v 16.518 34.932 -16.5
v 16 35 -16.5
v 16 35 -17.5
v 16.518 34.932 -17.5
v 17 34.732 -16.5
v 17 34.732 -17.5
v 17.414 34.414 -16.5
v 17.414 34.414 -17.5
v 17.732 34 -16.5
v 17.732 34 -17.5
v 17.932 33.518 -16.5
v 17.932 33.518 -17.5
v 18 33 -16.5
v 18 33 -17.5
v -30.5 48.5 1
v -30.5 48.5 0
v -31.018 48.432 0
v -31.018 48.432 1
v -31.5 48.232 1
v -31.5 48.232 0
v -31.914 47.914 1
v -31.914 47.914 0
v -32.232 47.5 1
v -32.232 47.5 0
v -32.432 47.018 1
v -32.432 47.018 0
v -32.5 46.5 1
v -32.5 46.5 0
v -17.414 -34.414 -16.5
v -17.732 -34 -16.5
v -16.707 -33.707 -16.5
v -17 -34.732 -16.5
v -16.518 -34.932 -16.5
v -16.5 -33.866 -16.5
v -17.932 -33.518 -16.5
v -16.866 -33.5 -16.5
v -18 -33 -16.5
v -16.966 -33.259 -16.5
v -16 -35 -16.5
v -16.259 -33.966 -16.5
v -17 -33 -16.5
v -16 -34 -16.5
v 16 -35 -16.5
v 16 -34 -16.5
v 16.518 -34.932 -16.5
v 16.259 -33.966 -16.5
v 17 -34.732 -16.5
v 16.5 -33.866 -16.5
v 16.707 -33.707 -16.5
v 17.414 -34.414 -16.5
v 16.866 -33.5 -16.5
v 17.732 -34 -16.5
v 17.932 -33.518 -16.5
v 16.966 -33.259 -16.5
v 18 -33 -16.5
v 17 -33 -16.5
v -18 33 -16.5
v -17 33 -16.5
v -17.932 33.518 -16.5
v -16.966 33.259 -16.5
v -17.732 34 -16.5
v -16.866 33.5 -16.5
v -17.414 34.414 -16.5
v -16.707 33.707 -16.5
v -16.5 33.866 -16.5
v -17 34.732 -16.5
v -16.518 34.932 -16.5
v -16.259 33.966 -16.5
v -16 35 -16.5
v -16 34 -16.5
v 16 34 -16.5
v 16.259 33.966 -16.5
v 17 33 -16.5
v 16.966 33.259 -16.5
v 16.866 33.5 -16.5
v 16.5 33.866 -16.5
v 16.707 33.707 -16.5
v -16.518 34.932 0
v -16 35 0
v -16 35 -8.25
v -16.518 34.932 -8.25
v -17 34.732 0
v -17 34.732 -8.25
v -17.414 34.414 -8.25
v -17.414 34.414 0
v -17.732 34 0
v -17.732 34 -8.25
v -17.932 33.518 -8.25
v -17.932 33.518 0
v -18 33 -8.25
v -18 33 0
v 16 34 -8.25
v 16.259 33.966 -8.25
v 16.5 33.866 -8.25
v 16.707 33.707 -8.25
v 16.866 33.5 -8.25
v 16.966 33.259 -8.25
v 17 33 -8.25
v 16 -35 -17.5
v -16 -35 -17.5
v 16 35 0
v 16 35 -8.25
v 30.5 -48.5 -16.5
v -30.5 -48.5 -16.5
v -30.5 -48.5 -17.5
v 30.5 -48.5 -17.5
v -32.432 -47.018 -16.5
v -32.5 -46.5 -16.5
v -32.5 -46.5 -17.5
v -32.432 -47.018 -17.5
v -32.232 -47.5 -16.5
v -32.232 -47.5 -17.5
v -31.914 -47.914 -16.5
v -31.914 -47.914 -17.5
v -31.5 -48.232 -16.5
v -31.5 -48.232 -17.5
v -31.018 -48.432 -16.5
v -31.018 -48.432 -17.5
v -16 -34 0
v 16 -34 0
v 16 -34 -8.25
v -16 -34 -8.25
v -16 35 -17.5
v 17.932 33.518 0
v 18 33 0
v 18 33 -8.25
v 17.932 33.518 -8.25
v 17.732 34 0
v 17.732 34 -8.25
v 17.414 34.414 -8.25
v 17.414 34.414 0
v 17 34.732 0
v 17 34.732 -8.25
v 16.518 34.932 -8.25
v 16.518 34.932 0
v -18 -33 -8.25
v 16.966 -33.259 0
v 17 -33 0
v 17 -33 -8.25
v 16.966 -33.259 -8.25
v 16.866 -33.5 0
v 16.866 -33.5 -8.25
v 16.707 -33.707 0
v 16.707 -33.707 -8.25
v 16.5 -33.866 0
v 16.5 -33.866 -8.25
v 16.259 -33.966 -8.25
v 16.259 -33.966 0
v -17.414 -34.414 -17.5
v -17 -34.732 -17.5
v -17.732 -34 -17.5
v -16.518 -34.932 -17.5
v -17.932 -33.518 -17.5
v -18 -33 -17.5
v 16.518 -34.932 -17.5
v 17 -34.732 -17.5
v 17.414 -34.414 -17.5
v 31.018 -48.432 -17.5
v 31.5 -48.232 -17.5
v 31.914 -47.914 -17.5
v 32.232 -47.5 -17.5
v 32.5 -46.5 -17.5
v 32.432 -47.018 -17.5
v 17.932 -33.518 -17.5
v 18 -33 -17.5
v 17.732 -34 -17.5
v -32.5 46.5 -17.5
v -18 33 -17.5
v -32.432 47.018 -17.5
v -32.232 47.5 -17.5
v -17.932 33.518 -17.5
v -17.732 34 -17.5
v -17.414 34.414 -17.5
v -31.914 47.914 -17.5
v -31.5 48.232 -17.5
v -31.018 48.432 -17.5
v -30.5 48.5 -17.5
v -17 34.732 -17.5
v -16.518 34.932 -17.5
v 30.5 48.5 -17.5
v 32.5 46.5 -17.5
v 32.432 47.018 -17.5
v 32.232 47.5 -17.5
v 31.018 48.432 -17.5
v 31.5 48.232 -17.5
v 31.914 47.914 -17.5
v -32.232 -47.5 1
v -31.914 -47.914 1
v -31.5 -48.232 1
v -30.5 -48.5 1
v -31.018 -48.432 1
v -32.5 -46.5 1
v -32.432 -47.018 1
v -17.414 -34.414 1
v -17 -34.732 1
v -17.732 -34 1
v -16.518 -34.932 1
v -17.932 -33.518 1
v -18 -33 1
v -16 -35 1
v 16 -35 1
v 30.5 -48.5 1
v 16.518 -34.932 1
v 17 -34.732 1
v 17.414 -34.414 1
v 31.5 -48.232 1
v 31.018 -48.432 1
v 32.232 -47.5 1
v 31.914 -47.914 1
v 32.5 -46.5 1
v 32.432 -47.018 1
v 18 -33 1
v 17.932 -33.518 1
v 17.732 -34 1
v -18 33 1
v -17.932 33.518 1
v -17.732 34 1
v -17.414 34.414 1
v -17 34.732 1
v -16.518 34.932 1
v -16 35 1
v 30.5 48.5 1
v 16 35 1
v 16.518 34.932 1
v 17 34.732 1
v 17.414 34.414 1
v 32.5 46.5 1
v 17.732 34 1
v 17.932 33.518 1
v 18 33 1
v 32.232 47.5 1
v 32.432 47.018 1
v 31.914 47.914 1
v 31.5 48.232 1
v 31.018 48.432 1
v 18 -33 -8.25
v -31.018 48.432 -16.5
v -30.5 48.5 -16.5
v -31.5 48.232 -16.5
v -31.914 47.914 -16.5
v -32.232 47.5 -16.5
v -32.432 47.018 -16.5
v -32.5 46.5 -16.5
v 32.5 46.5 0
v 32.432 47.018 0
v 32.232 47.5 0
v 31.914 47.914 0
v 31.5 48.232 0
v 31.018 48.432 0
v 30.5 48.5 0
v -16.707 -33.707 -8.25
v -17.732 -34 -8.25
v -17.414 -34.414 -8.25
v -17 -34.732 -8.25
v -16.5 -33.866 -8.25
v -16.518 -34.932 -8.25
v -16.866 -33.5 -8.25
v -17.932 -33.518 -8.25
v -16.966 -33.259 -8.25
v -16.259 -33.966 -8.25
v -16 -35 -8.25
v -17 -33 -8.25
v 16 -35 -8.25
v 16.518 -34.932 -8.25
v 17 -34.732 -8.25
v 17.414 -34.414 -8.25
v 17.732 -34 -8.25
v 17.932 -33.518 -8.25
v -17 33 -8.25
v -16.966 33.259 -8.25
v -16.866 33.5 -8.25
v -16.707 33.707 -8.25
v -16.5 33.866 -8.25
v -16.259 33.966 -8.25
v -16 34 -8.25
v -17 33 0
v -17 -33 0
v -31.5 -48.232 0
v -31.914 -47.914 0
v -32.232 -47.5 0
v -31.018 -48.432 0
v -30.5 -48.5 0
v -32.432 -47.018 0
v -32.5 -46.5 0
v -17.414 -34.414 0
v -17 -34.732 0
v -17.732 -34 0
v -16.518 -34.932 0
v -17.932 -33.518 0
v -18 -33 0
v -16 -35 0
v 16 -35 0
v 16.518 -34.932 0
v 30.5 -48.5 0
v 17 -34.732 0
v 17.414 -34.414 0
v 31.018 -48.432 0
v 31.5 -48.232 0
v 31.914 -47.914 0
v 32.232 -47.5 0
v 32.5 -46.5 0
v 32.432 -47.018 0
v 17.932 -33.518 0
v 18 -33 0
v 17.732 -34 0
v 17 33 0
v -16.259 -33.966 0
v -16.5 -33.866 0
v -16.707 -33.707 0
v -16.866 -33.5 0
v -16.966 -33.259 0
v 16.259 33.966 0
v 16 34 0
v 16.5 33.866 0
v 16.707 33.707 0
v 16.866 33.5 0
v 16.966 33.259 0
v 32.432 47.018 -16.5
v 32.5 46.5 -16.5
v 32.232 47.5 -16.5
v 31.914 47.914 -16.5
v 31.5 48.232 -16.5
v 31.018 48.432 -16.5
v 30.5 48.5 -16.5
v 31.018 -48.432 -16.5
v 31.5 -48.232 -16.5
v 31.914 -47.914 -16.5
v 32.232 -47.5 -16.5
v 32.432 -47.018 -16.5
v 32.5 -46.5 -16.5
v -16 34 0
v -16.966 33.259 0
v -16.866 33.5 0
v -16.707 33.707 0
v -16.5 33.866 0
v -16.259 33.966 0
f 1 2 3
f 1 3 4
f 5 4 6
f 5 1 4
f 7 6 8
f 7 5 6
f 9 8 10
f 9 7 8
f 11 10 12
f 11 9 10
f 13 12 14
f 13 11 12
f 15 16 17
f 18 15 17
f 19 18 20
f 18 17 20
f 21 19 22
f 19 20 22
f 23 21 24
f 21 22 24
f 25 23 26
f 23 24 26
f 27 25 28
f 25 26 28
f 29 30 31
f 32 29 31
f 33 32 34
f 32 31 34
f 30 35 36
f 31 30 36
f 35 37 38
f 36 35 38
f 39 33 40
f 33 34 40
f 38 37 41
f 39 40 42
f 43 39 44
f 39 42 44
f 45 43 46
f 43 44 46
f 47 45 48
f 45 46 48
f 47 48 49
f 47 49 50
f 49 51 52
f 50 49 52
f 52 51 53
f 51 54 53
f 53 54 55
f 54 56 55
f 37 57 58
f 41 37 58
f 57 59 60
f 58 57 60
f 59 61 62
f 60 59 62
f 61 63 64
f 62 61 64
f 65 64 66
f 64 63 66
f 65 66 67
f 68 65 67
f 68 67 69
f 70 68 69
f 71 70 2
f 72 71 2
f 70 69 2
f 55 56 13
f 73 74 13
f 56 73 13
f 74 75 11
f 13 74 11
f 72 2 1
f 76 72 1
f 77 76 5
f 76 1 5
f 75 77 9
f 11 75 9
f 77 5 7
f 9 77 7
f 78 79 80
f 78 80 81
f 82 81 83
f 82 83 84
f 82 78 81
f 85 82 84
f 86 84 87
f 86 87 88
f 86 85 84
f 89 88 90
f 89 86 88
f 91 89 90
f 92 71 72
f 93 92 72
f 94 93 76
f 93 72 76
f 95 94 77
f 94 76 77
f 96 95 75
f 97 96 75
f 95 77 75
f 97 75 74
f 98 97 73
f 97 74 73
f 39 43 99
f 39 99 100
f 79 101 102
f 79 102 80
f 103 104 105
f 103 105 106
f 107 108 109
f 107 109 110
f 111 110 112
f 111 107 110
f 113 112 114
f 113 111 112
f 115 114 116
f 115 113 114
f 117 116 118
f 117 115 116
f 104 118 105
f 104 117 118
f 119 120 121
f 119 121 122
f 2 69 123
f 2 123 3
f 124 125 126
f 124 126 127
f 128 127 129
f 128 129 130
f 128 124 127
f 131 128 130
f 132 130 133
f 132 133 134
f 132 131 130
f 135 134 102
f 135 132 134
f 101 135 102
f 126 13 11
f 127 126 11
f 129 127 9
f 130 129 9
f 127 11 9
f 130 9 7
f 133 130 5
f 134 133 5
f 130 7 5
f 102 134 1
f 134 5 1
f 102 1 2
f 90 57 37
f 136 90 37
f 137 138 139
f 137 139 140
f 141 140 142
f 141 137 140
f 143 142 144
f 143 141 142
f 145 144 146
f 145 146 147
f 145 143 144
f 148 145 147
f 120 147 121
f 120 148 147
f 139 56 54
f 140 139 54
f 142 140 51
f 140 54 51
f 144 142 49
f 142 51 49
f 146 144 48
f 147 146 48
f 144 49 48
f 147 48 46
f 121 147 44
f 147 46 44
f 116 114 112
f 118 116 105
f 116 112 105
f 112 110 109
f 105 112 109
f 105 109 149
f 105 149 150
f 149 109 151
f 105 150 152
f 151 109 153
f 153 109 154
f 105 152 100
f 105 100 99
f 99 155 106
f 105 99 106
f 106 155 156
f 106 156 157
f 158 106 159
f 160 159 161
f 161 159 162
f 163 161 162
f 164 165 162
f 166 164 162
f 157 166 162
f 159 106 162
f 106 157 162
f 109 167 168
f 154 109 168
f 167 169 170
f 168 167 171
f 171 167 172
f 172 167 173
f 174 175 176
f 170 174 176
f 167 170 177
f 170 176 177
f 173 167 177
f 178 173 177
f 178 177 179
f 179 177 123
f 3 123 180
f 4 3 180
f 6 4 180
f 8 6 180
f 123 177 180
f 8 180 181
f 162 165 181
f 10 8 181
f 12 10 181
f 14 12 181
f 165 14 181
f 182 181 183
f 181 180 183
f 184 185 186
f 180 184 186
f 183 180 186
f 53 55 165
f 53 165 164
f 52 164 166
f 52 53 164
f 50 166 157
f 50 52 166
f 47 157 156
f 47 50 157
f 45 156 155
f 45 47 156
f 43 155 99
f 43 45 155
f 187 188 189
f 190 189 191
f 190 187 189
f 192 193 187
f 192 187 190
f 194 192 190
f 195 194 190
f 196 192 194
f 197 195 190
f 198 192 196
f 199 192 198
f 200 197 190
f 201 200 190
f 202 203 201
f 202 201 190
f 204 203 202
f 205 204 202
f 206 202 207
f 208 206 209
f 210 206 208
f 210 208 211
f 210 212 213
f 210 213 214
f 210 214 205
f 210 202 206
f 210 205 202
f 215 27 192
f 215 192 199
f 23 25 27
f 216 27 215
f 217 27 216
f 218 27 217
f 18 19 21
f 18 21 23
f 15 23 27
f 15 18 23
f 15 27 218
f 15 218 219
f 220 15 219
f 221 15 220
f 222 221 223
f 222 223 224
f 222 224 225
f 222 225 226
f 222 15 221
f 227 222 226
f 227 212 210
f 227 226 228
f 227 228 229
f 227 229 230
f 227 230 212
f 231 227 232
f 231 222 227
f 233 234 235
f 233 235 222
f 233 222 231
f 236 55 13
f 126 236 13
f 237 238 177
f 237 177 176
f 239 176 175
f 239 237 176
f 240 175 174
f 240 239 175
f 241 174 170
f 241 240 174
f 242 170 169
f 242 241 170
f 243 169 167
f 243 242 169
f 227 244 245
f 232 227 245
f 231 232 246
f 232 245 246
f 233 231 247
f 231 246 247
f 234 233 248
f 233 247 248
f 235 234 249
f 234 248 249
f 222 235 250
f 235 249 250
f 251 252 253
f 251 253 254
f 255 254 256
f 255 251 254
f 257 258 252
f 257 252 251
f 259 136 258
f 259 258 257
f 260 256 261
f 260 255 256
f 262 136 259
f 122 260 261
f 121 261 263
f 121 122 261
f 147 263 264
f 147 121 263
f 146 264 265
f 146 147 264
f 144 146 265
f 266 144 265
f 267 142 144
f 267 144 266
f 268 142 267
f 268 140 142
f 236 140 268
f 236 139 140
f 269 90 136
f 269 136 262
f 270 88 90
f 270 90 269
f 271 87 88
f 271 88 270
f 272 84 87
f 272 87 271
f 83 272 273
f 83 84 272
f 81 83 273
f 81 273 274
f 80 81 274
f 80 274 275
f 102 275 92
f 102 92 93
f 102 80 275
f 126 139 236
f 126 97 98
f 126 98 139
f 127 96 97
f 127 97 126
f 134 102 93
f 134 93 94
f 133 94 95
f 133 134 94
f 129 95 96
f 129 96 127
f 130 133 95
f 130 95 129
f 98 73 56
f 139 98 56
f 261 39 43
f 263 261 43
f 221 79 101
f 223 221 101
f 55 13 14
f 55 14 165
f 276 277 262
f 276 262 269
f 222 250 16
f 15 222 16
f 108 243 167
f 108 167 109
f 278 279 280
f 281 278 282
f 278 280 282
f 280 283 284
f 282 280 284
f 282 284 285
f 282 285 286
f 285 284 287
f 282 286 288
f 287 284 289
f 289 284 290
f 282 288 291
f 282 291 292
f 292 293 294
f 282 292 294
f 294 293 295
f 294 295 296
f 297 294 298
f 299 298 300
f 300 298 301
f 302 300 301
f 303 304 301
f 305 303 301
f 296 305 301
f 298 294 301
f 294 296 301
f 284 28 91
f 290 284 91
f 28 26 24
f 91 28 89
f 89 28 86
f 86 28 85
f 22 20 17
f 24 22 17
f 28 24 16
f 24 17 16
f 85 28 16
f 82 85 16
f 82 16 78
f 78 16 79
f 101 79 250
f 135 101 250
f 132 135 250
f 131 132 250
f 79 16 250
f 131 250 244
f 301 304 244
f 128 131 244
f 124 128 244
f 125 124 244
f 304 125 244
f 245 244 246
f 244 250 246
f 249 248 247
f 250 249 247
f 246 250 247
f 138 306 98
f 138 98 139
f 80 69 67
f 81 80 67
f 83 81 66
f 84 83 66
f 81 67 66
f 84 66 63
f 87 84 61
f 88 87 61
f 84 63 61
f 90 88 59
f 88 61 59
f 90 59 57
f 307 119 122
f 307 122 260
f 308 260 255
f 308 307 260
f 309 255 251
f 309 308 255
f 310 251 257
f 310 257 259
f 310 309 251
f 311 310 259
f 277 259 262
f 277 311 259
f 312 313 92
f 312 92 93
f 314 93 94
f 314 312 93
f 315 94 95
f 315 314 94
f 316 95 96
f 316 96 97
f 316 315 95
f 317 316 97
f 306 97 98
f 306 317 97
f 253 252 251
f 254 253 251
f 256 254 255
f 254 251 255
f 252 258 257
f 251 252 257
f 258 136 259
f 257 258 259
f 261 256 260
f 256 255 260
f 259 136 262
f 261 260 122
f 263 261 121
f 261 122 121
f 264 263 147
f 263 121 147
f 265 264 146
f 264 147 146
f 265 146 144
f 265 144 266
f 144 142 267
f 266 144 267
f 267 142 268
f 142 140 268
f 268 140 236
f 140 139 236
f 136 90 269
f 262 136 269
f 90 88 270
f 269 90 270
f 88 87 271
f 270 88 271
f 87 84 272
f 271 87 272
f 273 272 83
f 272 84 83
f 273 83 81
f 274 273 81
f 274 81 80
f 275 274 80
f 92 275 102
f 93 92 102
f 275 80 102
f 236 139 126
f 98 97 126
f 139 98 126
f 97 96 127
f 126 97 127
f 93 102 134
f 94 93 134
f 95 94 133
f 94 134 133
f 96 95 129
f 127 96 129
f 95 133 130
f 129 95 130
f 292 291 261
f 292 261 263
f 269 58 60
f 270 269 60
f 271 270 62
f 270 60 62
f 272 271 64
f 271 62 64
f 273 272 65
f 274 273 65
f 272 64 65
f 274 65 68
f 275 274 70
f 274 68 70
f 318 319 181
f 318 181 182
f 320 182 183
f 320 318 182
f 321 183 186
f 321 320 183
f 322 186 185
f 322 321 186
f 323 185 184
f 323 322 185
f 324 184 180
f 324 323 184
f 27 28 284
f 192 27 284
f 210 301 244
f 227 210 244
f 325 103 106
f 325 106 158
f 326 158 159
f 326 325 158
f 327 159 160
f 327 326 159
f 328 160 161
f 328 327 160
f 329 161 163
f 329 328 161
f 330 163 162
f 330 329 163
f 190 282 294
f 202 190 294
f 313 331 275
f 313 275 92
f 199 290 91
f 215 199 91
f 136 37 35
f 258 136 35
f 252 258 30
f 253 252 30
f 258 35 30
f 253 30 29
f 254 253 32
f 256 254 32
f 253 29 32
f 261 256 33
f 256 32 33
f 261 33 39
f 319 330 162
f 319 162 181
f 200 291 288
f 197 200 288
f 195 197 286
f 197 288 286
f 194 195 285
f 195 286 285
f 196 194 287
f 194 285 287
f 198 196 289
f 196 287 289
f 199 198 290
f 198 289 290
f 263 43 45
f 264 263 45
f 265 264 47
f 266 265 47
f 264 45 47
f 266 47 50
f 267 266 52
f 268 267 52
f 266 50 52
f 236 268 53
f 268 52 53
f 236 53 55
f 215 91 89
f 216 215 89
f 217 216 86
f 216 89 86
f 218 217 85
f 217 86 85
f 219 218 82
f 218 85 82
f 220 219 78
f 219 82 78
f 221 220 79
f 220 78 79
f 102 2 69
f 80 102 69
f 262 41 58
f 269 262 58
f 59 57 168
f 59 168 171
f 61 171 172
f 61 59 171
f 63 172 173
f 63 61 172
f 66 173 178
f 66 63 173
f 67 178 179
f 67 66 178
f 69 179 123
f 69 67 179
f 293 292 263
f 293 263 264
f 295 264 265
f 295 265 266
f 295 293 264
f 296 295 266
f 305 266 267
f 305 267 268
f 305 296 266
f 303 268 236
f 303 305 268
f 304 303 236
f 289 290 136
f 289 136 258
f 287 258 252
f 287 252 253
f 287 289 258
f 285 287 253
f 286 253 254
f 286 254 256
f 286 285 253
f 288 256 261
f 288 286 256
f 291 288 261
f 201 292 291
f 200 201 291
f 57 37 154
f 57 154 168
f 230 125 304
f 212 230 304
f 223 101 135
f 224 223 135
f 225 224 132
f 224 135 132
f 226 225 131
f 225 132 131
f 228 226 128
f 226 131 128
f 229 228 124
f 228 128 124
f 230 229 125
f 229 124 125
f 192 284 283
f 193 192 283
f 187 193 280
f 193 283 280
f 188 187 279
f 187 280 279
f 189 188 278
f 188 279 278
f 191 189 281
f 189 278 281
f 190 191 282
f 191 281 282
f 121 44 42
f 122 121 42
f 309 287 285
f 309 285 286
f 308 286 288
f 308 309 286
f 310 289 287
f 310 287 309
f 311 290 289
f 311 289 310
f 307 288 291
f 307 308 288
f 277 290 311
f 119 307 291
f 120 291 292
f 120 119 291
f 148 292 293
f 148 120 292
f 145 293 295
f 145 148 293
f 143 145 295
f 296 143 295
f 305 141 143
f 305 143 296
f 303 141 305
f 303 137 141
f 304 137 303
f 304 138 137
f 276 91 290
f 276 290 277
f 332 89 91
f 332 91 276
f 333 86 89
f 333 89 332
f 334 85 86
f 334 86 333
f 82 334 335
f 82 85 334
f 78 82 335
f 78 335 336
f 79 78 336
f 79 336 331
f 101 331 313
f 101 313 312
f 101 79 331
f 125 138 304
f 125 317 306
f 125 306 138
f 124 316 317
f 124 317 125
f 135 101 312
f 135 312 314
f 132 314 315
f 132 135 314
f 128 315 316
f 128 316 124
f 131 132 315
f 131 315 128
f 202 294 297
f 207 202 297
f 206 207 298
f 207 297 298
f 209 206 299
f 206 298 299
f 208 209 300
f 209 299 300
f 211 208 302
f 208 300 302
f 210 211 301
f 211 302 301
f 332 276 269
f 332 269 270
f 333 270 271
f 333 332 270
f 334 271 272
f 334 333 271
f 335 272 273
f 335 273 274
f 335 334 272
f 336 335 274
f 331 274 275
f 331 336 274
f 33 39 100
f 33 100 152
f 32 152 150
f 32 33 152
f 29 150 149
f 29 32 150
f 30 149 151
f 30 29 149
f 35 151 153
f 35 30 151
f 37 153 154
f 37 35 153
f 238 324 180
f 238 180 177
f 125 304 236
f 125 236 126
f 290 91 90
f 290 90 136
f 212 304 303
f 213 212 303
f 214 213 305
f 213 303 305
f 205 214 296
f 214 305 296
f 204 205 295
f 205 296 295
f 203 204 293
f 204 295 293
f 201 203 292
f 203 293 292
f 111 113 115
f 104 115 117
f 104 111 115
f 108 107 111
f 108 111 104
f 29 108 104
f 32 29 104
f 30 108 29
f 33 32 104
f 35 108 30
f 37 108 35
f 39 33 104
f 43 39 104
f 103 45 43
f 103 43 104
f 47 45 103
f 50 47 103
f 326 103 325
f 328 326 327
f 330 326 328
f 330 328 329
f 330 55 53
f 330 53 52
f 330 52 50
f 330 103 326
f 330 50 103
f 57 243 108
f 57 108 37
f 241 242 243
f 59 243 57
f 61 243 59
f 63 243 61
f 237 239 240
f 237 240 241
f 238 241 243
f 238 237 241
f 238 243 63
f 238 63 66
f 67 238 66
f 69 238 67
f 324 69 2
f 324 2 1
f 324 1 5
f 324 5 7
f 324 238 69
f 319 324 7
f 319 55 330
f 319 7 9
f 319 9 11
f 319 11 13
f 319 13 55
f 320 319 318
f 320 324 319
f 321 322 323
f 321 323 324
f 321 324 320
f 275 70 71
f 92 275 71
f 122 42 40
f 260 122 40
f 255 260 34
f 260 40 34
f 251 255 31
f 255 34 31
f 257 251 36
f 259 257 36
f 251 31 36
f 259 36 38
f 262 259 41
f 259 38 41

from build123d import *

# Parameters (mm, degrees)
F1_DEPTH = 1
F2_DEPTH = 8.25


with BuildPart() as f1:
    # F0 (on Top) → F1 (new body)
    with BuildSketch(Plane.XY):
        with BuildLine():
            Line((32.5, -46.5), (32.5, 0))
            Line((32.5, 0), (32.5, 46.5))
            ThreePointArc((32.5, 46.5), (31.914214, 47.914214), (30.5, 48.5))
            Line((30.5, 48.5), (0, 48.5))
            Line((0, 48.5), (-30.5, 48.5))
            ThreePointArc((-30.5, 48.5), (-31.914214, 47.914214), (-32.5, 46.5))
            Line((-32.5, 46.5), (-32.5, 0))
            Line((-32.5, 0), (-32.5, -46.5))
            ThreePointArc((-32.5, -46.5), (-31.914214, -47.914214), (-30.5, -48.5))
            Line((-30.5, -48.5), (0, -48.5))
            Line((0, -48.5), (30.5, -48.5))
            ThreePointArc((30.5, -48.5), (31.914214, -47.914214), (32.5, -46.5))
        make_face()
        with BuildLine():
            ThreePointArc((16, 35), (17.414214, 34.414214), (18, 33))
            Line((18, 33), (18, -33))
            ThreePointArc((18, -33), (17.414214, -34.414214), (16, -35))
            Line((16, -35), (-16, -35))
            ThreePointArc((-16, -35), (-17.414214, -34.414214), (-18, -33))
            Line((-18, -33), (-18, 33))
            ThreePointArc((-18, 33), (-17.414214, 34.414214), (-16, 35))
            Line((-16, 35), (16, 35))
        make_face(mode=Mode.SUBTRACT)
    extrude(amount=F1_DEPTH)


with BuildPart() as f2:
    # F0 (on Top) → F2 (new body)
    with BuildSketch(Plane.XY):
        with BuildLine():
            Line((18, -33), (18, 33))
            ThreePointArc((18, 33), (17.414214, 34.414214), (16, 35))
            Line((16, 35), (-16, 35))
            ThreePointArc((-16, 35), (-17.414214, 34.414214), (-18, 33))
            Line((-18, 33), (-18, -33))
            ThreePointArc((-18, -33), (-17.414214, -34.414214), (-16, -35))
            Line((-16, -35), (16, -35))
            ThreePointArc((16, -35), (17.414214, -34.414214), (18, -33))
        make_face()
        with BuildLine():
            ThreePointArc((16, 34), (16.707107, 33.707107), (17, 33))
            Line((17, 33), (17, -33))
            ThreePointArc((17, -33), (16.707107, -33.707107), (16, -34))
            Line((16, -34), (-16, -34))
            ThreePointArc((-16, -34), (-16.707107, -33.707107), (-17, -33))
            Line((-17, -33), (-17, 33))
            ThreePointArc((-17, 33), (-16.707107, 33.707107), (-16, 34))
            Line((-16, 34), (16, 34))
        make_face(mode=Mode.SUBTRACT)
    extrude(amount=-F2_DEPTH)


with BuildPart() as f4_1:
    # F4: instance of F1
    add(f1.part.mirror(Plane.XY.offset(-8.25)))


with BuildPart() as f4_2:
    # F4: instance of F2
    add(f2.part.mirror(Plane.XY.offset(-8.25)))


solid = Compound([f1.part, f2.part, f4_1.part, f4_2.part])
